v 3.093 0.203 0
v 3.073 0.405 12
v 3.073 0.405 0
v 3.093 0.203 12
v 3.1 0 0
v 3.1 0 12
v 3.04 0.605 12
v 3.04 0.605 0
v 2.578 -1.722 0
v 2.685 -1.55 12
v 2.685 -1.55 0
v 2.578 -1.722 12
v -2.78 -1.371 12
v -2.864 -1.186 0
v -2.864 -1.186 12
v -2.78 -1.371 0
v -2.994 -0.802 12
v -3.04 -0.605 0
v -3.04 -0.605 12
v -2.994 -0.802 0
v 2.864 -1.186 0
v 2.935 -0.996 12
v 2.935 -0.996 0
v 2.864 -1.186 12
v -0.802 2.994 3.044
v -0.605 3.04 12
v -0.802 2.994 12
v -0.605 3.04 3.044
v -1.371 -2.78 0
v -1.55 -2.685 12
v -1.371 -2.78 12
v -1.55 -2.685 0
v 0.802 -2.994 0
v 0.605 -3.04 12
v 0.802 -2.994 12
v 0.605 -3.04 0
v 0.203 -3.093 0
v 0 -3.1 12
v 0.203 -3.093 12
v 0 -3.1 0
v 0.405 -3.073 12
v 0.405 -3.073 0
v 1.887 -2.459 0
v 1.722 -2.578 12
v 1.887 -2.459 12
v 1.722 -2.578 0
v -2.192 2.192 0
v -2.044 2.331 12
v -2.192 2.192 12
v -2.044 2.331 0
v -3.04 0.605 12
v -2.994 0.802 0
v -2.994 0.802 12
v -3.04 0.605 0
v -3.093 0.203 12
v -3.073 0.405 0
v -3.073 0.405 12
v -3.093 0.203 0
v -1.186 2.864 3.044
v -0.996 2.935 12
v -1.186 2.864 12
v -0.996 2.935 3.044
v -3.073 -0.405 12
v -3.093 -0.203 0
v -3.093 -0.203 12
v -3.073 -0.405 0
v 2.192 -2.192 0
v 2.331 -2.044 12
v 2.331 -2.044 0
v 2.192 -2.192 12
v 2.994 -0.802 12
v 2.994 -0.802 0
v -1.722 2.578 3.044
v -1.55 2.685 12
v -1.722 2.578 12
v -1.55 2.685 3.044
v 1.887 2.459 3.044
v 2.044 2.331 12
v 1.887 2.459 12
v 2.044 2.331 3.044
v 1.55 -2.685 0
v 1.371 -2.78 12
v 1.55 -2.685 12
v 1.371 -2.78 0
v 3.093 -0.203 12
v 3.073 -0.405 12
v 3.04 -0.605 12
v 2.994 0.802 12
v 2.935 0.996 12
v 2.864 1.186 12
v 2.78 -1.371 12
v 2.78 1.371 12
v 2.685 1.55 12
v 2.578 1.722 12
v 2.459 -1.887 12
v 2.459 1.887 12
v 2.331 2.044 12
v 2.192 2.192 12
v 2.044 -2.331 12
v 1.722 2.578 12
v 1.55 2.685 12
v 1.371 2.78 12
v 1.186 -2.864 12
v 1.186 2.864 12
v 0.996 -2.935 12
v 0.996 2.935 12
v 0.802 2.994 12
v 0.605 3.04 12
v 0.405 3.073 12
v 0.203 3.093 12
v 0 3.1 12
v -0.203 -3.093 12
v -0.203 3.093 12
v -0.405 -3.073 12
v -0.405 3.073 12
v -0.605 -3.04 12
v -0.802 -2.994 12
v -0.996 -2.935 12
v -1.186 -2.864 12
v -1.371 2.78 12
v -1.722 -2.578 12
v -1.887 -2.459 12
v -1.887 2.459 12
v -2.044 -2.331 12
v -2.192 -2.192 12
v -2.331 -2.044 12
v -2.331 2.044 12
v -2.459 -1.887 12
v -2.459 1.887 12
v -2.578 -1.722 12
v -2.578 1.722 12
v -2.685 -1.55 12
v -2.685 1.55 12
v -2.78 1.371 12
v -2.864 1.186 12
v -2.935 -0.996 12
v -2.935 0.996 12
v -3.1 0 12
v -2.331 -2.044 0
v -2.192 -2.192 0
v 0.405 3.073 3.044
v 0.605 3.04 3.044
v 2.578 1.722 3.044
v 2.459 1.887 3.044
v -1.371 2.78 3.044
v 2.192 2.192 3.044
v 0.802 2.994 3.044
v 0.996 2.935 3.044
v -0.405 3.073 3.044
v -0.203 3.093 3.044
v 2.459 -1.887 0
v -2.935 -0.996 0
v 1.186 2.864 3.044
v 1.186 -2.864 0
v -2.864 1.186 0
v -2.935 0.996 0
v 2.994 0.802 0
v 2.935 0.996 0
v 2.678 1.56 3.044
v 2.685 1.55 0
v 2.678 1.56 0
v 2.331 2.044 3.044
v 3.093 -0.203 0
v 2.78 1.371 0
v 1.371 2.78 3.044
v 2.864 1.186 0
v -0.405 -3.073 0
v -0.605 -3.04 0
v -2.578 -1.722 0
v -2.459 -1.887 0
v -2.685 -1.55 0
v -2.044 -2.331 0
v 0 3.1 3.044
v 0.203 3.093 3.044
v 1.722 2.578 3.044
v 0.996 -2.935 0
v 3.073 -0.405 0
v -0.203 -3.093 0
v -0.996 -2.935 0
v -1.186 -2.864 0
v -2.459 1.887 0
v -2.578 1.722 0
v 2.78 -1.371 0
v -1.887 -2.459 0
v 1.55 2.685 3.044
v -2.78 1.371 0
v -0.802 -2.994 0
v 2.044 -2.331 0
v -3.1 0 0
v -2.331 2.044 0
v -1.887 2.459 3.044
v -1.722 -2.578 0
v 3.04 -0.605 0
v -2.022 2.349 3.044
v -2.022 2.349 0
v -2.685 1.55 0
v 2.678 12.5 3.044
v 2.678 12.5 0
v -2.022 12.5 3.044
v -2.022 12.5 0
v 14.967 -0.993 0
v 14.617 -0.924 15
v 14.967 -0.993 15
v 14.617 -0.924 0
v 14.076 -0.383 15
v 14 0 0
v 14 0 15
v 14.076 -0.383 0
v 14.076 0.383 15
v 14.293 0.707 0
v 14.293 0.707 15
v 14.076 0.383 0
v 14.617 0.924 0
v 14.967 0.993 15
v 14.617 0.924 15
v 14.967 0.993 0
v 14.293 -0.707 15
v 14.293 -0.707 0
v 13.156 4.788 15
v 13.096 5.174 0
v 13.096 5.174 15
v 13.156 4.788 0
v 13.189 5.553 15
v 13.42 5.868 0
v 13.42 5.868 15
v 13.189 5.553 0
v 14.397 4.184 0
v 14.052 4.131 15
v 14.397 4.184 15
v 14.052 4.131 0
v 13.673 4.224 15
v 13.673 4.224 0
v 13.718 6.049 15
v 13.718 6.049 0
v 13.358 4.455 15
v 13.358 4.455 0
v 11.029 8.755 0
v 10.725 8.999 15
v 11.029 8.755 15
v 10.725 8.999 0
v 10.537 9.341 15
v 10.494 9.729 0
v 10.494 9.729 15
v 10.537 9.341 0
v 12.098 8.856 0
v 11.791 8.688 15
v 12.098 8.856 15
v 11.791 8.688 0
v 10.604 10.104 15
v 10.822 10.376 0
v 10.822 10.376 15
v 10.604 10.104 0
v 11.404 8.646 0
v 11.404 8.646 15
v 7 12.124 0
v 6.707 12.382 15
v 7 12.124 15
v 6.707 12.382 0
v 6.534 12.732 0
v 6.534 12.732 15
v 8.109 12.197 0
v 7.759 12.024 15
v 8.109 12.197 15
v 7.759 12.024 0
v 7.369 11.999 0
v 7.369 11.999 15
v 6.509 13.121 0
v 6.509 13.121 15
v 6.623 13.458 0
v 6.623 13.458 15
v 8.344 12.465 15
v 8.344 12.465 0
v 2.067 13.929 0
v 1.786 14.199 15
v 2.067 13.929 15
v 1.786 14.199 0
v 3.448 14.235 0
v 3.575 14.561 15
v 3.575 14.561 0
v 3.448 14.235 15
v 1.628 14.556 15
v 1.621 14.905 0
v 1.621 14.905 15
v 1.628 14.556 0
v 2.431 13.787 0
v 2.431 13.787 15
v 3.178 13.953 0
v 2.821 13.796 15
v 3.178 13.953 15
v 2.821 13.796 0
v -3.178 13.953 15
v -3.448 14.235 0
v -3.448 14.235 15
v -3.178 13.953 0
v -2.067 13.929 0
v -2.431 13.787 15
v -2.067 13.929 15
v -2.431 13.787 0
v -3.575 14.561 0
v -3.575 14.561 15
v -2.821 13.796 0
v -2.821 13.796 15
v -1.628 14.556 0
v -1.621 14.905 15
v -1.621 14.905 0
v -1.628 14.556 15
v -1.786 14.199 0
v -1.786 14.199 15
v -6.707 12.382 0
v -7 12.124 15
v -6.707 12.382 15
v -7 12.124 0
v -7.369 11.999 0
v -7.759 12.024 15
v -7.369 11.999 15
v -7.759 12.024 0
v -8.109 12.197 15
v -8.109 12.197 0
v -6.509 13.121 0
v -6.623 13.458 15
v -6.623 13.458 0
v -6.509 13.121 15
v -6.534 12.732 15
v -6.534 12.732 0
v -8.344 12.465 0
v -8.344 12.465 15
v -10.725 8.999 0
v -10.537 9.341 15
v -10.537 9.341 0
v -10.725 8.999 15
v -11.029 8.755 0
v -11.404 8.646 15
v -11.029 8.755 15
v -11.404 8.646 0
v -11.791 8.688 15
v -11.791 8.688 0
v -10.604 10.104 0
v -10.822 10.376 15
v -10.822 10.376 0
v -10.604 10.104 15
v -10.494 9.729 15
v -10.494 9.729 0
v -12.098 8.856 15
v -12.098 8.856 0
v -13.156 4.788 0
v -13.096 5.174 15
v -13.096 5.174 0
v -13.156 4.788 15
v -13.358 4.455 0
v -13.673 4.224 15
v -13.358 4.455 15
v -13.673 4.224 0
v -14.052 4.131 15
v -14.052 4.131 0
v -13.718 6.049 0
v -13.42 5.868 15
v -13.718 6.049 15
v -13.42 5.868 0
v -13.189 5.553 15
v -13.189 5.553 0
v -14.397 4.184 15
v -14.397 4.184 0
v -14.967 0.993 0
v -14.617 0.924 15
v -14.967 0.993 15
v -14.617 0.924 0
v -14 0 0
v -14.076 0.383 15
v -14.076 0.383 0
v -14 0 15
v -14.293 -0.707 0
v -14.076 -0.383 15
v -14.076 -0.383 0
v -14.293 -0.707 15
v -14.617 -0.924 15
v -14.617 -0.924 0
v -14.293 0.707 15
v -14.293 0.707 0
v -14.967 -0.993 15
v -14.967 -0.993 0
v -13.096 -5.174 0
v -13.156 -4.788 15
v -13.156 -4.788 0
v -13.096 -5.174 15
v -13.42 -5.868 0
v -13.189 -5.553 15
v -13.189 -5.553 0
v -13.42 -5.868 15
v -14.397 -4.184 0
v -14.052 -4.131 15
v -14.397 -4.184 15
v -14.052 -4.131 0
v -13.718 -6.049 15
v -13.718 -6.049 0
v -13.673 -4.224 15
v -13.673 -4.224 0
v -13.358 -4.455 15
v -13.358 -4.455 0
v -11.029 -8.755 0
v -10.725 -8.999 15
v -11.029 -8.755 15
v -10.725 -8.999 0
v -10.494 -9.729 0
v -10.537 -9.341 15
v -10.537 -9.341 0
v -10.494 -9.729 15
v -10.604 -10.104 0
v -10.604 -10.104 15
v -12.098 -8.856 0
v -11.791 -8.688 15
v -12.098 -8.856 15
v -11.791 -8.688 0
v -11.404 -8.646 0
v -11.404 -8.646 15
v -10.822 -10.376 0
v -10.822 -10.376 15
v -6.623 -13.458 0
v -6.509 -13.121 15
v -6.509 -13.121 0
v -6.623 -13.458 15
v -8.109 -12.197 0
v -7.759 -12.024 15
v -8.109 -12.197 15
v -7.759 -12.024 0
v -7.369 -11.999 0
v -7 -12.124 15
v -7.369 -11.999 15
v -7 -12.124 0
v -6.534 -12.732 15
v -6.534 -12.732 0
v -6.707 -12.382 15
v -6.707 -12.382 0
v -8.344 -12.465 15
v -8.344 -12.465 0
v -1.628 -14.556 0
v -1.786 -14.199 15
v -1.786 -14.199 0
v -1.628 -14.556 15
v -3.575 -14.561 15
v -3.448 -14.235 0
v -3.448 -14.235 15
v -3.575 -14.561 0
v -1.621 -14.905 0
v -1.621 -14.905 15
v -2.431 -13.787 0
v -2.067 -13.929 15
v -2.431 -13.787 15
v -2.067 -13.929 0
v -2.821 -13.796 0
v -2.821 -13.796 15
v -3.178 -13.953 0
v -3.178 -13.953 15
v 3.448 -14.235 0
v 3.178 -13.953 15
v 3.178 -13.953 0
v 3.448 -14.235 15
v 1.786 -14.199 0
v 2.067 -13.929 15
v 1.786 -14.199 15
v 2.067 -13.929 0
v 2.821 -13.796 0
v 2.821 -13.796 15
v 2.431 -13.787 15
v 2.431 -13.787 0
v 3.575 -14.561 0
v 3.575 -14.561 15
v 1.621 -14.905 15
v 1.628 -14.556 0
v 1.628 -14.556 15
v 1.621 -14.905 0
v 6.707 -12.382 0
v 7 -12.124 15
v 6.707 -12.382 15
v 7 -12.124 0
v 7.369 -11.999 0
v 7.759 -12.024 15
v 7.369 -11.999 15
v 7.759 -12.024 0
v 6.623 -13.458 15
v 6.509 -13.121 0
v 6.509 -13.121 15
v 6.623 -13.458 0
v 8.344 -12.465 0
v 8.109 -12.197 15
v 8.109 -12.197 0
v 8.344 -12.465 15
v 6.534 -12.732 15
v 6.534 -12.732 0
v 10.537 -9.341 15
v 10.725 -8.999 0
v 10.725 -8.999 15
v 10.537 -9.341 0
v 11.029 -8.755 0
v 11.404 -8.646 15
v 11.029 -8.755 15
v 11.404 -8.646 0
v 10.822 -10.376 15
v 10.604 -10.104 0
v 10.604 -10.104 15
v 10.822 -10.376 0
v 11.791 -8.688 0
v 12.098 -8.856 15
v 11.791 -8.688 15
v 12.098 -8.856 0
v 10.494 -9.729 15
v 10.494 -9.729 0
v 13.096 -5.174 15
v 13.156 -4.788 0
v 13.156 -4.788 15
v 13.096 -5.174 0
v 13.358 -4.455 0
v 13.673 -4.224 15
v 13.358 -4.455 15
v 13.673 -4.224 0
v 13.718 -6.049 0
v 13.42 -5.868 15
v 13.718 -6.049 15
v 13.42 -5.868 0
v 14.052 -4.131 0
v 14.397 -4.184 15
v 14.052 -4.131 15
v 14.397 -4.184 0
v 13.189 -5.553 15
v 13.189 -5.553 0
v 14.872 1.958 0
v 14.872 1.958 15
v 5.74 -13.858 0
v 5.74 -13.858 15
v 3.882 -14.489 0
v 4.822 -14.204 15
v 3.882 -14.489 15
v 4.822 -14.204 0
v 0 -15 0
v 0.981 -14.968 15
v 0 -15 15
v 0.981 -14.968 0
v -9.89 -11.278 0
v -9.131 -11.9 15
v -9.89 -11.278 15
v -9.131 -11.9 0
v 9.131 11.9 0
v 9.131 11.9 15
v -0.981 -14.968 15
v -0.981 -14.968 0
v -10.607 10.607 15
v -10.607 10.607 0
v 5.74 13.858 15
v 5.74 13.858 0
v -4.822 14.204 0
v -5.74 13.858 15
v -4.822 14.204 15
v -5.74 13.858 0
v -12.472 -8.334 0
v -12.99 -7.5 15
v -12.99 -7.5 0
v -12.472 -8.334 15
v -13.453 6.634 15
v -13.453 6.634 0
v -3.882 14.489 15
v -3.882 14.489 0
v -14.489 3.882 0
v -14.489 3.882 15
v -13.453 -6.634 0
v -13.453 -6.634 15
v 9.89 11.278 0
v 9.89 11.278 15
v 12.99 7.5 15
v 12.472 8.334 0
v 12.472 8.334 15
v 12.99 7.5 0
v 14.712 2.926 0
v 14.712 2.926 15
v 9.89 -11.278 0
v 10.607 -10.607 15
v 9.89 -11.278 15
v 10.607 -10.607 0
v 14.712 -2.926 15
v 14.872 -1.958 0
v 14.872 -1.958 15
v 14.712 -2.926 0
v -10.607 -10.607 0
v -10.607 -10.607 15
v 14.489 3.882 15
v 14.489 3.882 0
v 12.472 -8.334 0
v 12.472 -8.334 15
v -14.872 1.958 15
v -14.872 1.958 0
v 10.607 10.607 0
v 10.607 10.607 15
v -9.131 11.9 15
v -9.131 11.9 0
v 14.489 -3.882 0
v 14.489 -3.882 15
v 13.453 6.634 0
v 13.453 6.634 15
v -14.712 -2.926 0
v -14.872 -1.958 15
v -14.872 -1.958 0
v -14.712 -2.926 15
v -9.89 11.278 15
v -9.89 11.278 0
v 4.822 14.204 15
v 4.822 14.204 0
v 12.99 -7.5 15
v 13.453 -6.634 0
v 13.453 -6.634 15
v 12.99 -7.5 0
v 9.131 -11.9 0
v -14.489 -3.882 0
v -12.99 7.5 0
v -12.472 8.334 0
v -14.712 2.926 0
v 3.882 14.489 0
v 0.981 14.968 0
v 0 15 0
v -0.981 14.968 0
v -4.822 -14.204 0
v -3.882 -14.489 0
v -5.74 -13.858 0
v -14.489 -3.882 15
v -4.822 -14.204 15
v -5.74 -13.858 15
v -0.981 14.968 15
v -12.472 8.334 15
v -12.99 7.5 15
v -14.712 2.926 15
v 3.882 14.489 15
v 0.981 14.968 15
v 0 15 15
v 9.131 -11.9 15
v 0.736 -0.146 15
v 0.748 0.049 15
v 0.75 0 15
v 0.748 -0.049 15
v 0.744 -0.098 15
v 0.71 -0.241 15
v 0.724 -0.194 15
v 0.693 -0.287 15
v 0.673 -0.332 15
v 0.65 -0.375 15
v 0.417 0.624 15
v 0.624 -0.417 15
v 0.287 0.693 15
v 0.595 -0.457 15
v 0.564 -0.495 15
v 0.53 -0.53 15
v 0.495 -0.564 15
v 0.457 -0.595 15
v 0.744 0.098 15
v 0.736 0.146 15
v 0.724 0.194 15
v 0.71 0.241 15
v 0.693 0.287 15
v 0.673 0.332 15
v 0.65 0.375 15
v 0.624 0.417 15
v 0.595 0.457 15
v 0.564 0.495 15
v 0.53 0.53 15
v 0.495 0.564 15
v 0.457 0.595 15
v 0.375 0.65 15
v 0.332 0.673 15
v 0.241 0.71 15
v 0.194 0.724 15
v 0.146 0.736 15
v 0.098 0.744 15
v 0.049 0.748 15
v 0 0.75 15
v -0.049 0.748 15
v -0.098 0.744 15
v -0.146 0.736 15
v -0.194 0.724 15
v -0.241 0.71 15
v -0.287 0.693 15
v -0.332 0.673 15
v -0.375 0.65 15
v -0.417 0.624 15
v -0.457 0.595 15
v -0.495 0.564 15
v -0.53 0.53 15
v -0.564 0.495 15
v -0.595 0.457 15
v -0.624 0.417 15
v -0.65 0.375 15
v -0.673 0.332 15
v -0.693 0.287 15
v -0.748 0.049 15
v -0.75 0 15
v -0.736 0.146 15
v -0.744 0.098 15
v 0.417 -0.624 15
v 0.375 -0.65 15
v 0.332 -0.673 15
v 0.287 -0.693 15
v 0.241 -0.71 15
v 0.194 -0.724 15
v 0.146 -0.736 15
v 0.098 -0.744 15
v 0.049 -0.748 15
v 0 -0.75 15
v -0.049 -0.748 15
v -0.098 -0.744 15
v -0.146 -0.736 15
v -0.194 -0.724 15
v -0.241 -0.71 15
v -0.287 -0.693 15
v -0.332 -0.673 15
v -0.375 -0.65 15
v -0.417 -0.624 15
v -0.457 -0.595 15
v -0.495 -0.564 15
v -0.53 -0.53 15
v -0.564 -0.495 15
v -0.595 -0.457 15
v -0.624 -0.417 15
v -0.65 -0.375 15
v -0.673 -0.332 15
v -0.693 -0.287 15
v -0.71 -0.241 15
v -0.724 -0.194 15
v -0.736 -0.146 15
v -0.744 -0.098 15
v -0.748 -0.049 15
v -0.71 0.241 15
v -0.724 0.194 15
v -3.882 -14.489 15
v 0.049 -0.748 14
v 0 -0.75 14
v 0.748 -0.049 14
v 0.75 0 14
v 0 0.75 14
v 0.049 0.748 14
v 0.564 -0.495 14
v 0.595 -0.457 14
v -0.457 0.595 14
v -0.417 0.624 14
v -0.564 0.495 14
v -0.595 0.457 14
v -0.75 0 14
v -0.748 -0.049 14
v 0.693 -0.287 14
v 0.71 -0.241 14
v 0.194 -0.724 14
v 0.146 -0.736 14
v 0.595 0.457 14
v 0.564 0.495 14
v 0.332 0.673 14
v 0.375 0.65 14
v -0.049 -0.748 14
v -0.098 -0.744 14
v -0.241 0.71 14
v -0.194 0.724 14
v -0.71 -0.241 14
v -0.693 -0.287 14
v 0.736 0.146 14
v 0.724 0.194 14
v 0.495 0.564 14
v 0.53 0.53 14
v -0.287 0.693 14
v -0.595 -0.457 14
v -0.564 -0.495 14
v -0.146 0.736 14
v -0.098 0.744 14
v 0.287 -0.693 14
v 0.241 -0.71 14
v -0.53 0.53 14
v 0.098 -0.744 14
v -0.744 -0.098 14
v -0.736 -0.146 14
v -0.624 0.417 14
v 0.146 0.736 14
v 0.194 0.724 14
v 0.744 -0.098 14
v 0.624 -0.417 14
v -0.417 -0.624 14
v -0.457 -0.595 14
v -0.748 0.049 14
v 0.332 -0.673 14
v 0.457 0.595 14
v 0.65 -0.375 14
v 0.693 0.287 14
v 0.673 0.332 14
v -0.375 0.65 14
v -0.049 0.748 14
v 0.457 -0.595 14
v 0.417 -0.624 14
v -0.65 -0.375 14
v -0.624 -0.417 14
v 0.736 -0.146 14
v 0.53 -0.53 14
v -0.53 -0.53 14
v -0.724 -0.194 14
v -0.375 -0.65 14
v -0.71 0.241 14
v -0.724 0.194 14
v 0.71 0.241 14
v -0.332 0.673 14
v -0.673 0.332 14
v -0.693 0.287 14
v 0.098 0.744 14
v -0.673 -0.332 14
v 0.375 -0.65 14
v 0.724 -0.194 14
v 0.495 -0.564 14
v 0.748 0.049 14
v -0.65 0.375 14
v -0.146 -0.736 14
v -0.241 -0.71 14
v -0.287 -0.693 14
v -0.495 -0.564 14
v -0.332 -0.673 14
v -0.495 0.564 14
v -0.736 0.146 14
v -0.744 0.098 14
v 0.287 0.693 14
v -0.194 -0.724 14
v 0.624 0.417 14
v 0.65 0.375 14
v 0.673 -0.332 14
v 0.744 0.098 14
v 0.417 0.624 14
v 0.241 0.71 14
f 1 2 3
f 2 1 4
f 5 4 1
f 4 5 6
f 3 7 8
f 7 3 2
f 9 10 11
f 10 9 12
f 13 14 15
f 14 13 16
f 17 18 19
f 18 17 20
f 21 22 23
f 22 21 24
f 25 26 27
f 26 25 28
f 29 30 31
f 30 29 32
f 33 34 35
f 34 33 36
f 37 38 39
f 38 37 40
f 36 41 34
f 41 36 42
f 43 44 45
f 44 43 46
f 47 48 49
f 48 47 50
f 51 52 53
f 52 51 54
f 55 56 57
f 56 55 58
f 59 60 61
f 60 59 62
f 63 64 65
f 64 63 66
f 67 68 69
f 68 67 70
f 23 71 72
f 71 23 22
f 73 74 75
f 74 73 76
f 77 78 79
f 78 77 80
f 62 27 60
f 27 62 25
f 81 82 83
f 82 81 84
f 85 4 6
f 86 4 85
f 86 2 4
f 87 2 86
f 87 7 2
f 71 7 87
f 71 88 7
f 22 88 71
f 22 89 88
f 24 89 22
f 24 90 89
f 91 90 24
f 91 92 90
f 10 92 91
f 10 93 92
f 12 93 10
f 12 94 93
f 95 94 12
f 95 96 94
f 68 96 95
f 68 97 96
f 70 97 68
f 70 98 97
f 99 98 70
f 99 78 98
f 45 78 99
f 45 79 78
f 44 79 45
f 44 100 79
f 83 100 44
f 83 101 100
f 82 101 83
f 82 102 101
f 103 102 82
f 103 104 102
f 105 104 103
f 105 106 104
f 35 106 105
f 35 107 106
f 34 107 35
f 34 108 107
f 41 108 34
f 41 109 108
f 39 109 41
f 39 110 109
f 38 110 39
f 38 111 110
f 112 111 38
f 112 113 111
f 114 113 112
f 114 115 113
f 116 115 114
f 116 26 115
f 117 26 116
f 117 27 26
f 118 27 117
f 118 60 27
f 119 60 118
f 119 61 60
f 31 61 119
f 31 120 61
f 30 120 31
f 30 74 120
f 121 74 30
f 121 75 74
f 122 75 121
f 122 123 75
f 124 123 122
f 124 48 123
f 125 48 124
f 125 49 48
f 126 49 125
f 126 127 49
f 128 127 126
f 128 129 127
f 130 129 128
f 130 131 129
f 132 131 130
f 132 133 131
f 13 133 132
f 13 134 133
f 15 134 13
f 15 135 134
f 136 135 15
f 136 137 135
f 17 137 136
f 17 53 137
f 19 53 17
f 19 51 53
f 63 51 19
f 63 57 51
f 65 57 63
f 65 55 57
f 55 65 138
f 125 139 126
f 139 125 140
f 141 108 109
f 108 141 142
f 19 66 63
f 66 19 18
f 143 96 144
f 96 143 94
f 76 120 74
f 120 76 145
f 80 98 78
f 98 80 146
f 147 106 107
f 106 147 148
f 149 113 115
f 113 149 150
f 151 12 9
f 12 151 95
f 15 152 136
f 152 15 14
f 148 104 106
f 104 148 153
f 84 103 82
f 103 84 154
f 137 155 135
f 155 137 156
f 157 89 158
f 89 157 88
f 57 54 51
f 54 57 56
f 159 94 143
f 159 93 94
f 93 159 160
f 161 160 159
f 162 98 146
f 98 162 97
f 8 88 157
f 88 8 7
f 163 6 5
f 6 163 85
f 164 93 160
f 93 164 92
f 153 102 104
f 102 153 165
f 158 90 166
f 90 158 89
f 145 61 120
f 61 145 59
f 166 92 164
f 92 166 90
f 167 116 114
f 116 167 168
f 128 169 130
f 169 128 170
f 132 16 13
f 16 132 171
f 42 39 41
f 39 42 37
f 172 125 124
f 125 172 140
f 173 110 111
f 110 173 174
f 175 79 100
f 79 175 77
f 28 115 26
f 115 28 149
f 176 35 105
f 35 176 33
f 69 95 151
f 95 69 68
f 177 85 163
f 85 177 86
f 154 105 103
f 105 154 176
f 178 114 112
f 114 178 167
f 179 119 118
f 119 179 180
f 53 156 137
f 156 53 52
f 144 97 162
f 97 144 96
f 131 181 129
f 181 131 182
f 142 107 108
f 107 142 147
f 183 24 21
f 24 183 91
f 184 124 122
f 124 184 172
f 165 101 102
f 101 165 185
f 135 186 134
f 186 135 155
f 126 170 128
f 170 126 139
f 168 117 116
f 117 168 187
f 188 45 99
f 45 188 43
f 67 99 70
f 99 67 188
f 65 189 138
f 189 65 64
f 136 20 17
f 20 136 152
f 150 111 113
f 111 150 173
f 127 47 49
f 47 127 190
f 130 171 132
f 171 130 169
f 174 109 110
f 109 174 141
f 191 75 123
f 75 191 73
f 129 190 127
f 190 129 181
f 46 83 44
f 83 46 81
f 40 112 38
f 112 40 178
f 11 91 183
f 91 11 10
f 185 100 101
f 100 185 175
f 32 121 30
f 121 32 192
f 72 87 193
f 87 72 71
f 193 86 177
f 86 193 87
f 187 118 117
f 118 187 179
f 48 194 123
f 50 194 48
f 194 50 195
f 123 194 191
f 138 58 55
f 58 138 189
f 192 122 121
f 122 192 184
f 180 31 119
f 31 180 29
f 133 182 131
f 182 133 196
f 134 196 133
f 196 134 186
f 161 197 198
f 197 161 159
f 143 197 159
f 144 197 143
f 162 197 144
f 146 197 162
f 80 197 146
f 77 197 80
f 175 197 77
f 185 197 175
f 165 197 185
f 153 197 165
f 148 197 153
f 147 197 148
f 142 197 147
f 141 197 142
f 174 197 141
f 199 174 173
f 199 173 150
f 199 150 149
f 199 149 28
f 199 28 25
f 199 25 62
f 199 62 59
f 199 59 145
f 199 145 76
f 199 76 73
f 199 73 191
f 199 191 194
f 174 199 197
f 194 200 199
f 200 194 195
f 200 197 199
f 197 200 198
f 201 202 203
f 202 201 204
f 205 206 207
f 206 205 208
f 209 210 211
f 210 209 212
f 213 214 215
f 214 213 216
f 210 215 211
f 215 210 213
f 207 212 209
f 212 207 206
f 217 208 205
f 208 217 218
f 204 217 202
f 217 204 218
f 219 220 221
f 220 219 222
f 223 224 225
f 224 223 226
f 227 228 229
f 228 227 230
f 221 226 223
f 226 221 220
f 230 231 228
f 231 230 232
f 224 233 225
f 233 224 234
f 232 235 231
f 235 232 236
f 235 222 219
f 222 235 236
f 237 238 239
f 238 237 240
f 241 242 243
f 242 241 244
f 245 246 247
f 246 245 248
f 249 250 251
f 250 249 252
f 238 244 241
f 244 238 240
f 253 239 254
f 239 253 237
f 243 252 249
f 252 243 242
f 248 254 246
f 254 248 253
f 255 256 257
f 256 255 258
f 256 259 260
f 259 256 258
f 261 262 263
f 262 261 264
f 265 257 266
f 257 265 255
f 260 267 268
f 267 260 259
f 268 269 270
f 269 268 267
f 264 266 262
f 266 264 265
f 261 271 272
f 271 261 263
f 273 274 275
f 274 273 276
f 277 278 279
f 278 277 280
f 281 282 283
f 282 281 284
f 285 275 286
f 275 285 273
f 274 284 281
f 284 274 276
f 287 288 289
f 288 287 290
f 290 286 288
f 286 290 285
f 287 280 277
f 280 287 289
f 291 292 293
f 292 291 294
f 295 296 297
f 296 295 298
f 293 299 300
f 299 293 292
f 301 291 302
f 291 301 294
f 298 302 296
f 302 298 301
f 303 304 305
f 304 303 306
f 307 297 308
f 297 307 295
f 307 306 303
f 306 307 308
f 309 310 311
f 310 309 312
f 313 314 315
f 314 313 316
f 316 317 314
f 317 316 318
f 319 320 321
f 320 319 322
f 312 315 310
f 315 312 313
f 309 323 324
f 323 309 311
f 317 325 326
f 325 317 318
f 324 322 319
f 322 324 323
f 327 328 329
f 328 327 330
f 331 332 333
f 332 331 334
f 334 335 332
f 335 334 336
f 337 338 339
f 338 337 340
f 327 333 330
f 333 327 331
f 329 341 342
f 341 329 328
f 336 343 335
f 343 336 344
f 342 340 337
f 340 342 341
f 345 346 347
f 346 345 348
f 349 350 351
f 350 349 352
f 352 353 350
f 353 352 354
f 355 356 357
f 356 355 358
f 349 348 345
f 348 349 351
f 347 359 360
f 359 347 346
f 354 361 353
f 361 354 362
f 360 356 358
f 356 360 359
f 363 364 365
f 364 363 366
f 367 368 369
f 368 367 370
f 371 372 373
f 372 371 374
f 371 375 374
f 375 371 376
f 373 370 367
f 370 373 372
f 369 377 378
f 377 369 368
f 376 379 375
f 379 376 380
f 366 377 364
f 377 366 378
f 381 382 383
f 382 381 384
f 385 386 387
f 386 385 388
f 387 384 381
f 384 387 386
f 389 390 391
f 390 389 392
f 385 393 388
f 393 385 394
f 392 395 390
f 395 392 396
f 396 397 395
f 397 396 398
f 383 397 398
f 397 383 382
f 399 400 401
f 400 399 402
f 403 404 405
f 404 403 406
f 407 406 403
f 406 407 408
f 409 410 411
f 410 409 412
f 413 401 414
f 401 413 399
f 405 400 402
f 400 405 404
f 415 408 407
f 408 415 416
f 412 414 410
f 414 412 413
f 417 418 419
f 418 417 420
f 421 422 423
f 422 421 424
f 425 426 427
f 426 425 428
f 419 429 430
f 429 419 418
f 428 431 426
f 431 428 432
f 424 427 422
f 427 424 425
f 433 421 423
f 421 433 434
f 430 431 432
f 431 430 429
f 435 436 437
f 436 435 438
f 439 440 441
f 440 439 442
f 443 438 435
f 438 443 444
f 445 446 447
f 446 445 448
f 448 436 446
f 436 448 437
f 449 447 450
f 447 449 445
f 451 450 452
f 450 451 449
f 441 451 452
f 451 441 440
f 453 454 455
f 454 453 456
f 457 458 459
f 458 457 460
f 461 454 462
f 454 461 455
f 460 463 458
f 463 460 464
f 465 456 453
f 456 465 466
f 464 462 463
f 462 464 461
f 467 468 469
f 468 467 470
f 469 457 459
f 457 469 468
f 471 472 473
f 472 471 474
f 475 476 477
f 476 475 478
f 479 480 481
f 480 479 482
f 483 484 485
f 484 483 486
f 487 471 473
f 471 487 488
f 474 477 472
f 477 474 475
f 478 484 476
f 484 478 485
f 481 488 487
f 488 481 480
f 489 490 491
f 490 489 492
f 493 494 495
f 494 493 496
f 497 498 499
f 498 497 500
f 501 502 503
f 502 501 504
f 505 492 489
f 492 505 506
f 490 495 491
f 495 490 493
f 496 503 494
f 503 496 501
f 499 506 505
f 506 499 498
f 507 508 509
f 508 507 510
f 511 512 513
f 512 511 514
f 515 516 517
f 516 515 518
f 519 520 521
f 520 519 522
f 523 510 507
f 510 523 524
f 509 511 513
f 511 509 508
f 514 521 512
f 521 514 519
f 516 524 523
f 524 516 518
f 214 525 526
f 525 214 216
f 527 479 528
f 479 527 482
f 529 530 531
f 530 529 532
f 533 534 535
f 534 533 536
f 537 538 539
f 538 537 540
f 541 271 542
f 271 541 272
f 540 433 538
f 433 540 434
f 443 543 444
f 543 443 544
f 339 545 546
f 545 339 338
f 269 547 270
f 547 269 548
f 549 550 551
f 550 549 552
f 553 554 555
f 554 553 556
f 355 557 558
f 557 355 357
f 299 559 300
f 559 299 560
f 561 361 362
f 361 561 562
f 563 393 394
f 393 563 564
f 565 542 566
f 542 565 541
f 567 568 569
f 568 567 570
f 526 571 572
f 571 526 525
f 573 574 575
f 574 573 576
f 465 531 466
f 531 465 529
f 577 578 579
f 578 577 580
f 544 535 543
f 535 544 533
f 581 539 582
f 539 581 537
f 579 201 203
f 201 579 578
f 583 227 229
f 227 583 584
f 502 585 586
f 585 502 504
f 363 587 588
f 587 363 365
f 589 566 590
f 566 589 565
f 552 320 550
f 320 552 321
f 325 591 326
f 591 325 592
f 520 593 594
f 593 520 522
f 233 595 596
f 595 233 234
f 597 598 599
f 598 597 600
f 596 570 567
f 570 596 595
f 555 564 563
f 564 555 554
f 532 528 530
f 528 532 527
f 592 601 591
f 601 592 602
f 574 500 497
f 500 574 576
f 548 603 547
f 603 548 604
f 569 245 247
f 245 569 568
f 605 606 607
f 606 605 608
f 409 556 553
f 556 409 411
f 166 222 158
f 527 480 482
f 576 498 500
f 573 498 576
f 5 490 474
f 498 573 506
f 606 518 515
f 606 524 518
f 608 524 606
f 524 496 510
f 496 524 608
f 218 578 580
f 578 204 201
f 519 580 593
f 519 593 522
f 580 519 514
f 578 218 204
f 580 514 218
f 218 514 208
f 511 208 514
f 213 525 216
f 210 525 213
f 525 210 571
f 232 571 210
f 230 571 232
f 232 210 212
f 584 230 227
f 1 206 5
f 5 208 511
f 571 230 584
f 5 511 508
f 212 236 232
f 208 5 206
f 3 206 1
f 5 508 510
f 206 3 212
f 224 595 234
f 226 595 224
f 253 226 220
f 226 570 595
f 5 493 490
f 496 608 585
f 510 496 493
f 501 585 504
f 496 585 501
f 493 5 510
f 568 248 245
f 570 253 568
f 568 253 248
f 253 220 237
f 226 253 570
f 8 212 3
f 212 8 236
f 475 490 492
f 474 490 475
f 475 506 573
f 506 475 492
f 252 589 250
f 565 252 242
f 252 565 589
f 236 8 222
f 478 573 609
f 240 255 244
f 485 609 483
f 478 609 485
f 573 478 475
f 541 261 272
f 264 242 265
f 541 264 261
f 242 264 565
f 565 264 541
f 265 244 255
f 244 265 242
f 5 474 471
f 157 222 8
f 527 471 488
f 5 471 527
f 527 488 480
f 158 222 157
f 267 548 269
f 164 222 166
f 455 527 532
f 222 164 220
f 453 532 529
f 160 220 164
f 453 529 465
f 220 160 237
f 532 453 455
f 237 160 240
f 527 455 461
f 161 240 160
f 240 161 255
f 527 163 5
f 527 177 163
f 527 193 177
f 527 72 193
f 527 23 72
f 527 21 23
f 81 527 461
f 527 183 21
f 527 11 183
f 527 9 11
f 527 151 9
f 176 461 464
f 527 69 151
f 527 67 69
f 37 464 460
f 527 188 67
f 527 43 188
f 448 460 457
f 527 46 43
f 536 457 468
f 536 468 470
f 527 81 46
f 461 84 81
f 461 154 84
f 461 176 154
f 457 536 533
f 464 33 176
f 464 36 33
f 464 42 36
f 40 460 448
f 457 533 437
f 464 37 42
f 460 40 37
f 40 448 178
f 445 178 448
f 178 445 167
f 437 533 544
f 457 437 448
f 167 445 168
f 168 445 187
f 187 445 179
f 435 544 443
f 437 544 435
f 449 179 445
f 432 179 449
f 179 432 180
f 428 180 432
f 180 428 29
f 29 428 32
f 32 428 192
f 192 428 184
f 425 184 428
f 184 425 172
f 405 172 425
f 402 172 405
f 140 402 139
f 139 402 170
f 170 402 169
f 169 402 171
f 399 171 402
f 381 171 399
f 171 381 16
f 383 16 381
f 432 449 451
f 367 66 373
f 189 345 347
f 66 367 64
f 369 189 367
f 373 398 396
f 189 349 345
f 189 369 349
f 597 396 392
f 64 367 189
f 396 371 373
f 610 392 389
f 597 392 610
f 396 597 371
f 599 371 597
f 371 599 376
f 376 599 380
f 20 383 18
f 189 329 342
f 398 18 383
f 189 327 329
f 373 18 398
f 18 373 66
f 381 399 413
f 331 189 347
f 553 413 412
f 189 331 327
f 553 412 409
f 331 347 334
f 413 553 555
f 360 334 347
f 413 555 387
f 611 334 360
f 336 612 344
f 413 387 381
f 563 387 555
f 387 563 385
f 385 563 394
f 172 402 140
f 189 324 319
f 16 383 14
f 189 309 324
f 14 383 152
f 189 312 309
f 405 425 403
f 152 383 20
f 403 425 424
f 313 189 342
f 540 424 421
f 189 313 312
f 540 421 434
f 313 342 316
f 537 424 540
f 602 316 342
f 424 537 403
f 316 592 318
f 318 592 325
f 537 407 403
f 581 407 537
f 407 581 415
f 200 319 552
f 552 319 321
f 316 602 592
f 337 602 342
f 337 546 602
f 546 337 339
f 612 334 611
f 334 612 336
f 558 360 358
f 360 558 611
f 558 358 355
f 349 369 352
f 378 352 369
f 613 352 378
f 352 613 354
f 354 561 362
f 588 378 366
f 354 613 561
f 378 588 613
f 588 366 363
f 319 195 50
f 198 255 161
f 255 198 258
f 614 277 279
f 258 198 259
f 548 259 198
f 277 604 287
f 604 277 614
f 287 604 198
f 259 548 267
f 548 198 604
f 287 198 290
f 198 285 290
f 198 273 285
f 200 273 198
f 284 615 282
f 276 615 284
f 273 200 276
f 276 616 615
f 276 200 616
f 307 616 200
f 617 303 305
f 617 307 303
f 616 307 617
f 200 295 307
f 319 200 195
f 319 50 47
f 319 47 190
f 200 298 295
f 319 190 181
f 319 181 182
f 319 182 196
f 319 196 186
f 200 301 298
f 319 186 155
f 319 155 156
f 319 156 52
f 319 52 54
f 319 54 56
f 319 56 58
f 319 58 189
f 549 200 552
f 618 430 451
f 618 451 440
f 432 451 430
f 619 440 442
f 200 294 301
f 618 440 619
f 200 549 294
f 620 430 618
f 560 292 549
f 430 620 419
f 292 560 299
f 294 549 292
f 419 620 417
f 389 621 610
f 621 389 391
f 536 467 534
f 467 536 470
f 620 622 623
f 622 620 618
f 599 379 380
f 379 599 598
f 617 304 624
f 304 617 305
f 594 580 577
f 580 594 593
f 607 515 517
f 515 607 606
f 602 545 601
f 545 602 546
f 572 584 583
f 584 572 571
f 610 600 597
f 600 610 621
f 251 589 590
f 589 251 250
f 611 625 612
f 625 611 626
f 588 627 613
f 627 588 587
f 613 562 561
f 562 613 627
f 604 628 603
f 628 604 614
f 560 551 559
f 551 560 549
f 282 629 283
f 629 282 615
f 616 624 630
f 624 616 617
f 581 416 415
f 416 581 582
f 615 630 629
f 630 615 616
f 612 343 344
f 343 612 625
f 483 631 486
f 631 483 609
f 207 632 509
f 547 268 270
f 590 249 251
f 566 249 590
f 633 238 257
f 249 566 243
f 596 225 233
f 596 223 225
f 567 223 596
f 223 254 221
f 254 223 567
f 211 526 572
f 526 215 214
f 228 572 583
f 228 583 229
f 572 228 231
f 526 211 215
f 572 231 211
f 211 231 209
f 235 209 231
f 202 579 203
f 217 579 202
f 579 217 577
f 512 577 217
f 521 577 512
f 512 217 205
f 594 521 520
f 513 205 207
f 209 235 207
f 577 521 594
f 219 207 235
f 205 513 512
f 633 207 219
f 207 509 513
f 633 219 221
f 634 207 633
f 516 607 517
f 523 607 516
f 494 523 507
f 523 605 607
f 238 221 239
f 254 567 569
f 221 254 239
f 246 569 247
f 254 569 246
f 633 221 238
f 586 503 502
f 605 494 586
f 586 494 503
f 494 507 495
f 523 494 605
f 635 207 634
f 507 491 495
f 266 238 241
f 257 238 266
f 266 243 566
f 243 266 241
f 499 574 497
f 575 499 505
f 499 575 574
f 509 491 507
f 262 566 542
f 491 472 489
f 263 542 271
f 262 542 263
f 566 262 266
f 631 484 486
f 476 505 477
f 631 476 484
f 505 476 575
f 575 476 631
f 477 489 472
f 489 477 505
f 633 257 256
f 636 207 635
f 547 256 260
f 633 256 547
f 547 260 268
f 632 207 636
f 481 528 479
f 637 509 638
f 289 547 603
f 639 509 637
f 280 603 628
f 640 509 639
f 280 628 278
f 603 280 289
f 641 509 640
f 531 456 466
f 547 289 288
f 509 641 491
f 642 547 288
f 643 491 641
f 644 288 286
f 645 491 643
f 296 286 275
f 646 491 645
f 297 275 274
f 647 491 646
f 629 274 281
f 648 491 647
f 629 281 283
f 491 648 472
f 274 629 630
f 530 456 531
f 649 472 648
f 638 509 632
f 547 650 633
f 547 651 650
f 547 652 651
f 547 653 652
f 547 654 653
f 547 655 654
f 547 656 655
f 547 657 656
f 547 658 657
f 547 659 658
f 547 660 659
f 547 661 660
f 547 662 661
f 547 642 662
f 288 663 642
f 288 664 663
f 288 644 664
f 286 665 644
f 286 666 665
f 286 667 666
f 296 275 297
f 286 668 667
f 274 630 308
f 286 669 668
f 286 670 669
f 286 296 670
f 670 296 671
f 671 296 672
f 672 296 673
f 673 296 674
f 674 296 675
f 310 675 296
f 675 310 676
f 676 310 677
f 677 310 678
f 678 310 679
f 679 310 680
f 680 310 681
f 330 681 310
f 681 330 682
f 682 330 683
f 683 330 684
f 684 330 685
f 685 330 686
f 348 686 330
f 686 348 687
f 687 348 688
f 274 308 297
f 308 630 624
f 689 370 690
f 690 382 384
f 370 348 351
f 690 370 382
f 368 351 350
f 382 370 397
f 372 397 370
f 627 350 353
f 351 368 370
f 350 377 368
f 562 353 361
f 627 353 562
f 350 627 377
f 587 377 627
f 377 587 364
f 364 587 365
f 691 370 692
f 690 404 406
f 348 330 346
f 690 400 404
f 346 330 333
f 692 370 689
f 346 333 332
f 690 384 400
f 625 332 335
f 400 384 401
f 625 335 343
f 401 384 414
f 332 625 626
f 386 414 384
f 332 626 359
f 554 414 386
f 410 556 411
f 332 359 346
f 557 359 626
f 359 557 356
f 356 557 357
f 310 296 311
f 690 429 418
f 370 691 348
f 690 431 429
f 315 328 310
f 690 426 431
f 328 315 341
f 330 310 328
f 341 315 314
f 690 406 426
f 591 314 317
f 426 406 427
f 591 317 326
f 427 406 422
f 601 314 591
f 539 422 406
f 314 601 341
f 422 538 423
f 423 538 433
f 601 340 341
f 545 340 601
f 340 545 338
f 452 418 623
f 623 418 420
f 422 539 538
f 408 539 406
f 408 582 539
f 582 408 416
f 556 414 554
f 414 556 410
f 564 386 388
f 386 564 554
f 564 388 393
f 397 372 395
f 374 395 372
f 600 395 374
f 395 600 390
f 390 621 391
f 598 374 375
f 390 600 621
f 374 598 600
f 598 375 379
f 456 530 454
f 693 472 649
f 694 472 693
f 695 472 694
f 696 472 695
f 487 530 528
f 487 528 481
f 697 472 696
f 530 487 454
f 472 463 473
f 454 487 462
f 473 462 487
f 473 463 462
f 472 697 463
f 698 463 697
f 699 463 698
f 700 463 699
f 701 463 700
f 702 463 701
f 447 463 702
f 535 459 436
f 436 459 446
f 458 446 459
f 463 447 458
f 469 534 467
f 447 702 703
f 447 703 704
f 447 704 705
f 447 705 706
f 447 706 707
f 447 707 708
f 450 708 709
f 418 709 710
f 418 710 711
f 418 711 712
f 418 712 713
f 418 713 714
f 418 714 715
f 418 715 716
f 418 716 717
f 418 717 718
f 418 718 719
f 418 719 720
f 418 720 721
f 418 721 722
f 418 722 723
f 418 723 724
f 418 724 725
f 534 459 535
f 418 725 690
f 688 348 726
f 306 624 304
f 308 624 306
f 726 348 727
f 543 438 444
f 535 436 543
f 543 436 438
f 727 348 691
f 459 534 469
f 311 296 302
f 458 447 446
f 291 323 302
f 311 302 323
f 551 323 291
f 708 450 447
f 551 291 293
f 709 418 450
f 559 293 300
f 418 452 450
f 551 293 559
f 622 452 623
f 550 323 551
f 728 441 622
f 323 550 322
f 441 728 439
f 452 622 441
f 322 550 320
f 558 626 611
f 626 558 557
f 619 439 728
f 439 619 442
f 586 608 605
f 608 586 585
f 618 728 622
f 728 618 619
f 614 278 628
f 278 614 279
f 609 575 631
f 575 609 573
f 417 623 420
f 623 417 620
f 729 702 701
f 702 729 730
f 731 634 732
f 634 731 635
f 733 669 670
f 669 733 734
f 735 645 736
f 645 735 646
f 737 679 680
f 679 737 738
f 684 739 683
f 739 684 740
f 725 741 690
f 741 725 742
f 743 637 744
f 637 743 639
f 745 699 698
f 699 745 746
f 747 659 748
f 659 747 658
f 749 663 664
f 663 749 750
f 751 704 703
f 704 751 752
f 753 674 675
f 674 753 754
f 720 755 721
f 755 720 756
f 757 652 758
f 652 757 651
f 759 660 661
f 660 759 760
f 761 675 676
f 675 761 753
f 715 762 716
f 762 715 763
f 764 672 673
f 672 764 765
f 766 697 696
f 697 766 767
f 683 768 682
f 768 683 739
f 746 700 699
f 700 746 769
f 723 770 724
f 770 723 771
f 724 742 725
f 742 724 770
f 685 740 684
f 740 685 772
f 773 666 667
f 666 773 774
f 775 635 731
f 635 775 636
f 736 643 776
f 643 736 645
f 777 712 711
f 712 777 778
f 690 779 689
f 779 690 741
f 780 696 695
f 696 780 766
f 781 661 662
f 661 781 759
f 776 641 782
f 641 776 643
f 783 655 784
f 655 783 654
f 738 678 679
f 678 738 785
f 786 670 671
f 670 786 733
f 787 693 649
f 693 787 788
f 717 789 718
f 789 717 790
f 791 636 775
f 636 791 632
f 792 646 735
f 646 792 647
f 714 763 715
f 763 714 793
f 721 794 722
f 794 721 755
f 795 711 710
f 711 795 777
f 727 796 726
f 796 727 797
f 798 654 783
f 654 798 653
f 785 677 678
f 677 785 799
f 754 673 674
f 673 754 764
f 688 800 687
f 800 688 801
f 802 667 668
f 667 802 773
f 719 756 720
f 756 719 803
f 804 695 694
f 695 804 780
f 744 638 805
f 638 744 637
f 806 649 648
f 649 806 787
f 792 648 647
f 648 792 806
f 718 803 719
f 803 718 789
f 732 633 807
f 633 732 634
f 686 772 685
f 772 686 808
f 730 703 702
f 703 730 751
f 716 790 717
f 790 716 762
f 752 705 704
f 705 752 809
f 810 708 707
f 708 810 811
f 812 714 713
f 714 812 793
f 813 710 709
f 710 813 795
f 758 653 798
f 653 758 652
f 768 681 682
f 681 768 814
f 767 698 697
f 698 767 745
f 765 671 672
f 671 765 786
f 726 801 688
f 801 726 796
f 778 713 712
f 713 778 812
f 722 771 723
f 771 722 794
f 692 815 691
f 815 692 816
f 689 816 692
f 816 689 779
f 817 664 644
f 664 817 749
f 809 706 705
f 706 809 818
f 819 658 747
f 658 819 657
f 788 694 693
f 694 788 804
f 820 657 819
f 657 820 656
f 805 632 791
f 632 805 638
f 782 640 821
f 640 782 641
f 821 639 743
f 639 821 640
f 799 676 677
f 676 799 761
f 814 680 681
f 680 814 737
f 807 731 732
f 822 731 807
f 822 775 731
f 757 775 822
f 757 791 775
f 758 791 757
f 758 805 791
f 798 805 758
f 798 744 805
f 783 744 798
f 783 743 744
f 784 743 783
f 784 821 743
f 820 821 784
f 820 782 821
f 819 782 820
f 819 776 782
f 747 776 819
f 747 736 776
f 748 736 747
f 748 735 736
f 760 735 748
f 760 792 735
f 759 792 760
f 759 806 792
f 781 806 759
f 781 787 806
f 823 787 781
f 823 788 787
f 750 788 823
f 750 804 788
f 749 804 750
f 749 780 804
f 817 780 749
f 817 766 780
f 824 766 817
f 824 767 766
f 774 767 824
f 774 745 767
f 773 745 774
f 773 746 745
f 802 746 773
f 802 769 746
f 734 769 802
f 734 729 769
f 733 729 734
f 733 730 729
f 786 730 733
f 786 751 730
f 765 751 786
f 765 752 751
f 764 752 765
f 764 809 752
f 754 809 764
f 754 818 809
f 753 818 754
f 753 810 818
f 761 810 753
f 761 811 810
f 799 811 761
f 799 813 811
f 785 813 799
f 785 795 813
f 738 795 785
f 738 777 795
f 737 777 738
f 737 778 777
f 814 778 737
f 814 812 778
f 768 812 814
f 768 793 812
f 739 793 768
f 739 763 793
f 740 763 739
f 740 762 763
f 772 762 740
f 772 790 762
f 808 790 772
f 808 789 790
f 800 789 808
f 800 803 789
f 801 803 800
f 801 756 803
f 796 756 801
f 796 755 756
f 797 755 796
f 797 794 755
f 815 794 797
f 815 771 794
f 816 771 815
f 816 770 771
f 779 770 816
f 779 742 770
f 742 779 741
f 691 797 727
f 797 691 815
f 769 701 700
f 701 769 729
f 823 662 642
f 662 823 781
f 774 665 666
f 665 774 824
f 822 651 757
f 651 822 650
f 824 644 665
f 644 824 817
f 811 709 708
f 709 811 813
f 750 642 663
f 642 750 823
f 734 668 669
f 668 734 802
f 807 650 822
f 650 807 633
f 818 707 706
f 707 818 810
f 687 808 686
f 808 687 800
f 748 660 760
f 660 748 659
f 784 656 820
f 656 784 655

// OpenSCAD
// Replacement knob for a hotplate stirrer with a 6 mm D-shaft
// Print orientation: bottom face (facing the hotplate) on the bed at z = 0

// ---------- Dimensions (mm) ----------
knob_d      = 30;    // knob outer diameter
knob_h      = 15;    // knob height
bore_depth  = 12;    // depth of D-bore from bottom face
bore_flat   = 4.7;   // distance from flat to opposite side of D-bore
bore_r      = 6.2 / 2; // radius of D-bore circle (6.2 mm diameter)
groove_n    = 18;    // number of vertical grip grooves
groove_d    = 2;     // grip groove diameter
pointer_w   = 1.5;   // pointer groove width
pointer_d   = 1;     // pointer groove depth

eps         = 0.5;   // overshoot for clean boolean cuts

// ---------- Derived ----------
bore_chord  = sqrt(bore_r * bore_r - (bore_flat / 2) * (bore_flat / 2)); // half-width of flat cut

// ---------- Model ----------
difference() {
    // Main body
    cylinder(d = knob_d, h = knob_h, $fn = 96);

    // D-shaped blind bore from bottom face
    translate([0, 0, -eps])
        union() {
            cylinder(r = bore_r, h = bore_depth + eps, $fn = 96);
            translate([-bore_chord, 0, -eps])
                cube([bore_flat, bore_depth + eps, 2 * bore_chord]);
        }

    // 18 evenly spaced vertical grip grooves, full height
    for (i = [0 : groove_n - 1])
        rotate([0, 0, i * 360 / groove_n])
            translate([knob_d / 2, 0, -eps])
                cylinder(d = groove_d, h = knob_h + 2 * eps, $fn = 16);

    // Pointer groove on top face, same side as D-bore flat
    translate([0, 0, knob_h - pointer_d])
        linear_extrude(height = pointer_d)
            circle(r = pointer_w / 2, $fn = 96);
}
